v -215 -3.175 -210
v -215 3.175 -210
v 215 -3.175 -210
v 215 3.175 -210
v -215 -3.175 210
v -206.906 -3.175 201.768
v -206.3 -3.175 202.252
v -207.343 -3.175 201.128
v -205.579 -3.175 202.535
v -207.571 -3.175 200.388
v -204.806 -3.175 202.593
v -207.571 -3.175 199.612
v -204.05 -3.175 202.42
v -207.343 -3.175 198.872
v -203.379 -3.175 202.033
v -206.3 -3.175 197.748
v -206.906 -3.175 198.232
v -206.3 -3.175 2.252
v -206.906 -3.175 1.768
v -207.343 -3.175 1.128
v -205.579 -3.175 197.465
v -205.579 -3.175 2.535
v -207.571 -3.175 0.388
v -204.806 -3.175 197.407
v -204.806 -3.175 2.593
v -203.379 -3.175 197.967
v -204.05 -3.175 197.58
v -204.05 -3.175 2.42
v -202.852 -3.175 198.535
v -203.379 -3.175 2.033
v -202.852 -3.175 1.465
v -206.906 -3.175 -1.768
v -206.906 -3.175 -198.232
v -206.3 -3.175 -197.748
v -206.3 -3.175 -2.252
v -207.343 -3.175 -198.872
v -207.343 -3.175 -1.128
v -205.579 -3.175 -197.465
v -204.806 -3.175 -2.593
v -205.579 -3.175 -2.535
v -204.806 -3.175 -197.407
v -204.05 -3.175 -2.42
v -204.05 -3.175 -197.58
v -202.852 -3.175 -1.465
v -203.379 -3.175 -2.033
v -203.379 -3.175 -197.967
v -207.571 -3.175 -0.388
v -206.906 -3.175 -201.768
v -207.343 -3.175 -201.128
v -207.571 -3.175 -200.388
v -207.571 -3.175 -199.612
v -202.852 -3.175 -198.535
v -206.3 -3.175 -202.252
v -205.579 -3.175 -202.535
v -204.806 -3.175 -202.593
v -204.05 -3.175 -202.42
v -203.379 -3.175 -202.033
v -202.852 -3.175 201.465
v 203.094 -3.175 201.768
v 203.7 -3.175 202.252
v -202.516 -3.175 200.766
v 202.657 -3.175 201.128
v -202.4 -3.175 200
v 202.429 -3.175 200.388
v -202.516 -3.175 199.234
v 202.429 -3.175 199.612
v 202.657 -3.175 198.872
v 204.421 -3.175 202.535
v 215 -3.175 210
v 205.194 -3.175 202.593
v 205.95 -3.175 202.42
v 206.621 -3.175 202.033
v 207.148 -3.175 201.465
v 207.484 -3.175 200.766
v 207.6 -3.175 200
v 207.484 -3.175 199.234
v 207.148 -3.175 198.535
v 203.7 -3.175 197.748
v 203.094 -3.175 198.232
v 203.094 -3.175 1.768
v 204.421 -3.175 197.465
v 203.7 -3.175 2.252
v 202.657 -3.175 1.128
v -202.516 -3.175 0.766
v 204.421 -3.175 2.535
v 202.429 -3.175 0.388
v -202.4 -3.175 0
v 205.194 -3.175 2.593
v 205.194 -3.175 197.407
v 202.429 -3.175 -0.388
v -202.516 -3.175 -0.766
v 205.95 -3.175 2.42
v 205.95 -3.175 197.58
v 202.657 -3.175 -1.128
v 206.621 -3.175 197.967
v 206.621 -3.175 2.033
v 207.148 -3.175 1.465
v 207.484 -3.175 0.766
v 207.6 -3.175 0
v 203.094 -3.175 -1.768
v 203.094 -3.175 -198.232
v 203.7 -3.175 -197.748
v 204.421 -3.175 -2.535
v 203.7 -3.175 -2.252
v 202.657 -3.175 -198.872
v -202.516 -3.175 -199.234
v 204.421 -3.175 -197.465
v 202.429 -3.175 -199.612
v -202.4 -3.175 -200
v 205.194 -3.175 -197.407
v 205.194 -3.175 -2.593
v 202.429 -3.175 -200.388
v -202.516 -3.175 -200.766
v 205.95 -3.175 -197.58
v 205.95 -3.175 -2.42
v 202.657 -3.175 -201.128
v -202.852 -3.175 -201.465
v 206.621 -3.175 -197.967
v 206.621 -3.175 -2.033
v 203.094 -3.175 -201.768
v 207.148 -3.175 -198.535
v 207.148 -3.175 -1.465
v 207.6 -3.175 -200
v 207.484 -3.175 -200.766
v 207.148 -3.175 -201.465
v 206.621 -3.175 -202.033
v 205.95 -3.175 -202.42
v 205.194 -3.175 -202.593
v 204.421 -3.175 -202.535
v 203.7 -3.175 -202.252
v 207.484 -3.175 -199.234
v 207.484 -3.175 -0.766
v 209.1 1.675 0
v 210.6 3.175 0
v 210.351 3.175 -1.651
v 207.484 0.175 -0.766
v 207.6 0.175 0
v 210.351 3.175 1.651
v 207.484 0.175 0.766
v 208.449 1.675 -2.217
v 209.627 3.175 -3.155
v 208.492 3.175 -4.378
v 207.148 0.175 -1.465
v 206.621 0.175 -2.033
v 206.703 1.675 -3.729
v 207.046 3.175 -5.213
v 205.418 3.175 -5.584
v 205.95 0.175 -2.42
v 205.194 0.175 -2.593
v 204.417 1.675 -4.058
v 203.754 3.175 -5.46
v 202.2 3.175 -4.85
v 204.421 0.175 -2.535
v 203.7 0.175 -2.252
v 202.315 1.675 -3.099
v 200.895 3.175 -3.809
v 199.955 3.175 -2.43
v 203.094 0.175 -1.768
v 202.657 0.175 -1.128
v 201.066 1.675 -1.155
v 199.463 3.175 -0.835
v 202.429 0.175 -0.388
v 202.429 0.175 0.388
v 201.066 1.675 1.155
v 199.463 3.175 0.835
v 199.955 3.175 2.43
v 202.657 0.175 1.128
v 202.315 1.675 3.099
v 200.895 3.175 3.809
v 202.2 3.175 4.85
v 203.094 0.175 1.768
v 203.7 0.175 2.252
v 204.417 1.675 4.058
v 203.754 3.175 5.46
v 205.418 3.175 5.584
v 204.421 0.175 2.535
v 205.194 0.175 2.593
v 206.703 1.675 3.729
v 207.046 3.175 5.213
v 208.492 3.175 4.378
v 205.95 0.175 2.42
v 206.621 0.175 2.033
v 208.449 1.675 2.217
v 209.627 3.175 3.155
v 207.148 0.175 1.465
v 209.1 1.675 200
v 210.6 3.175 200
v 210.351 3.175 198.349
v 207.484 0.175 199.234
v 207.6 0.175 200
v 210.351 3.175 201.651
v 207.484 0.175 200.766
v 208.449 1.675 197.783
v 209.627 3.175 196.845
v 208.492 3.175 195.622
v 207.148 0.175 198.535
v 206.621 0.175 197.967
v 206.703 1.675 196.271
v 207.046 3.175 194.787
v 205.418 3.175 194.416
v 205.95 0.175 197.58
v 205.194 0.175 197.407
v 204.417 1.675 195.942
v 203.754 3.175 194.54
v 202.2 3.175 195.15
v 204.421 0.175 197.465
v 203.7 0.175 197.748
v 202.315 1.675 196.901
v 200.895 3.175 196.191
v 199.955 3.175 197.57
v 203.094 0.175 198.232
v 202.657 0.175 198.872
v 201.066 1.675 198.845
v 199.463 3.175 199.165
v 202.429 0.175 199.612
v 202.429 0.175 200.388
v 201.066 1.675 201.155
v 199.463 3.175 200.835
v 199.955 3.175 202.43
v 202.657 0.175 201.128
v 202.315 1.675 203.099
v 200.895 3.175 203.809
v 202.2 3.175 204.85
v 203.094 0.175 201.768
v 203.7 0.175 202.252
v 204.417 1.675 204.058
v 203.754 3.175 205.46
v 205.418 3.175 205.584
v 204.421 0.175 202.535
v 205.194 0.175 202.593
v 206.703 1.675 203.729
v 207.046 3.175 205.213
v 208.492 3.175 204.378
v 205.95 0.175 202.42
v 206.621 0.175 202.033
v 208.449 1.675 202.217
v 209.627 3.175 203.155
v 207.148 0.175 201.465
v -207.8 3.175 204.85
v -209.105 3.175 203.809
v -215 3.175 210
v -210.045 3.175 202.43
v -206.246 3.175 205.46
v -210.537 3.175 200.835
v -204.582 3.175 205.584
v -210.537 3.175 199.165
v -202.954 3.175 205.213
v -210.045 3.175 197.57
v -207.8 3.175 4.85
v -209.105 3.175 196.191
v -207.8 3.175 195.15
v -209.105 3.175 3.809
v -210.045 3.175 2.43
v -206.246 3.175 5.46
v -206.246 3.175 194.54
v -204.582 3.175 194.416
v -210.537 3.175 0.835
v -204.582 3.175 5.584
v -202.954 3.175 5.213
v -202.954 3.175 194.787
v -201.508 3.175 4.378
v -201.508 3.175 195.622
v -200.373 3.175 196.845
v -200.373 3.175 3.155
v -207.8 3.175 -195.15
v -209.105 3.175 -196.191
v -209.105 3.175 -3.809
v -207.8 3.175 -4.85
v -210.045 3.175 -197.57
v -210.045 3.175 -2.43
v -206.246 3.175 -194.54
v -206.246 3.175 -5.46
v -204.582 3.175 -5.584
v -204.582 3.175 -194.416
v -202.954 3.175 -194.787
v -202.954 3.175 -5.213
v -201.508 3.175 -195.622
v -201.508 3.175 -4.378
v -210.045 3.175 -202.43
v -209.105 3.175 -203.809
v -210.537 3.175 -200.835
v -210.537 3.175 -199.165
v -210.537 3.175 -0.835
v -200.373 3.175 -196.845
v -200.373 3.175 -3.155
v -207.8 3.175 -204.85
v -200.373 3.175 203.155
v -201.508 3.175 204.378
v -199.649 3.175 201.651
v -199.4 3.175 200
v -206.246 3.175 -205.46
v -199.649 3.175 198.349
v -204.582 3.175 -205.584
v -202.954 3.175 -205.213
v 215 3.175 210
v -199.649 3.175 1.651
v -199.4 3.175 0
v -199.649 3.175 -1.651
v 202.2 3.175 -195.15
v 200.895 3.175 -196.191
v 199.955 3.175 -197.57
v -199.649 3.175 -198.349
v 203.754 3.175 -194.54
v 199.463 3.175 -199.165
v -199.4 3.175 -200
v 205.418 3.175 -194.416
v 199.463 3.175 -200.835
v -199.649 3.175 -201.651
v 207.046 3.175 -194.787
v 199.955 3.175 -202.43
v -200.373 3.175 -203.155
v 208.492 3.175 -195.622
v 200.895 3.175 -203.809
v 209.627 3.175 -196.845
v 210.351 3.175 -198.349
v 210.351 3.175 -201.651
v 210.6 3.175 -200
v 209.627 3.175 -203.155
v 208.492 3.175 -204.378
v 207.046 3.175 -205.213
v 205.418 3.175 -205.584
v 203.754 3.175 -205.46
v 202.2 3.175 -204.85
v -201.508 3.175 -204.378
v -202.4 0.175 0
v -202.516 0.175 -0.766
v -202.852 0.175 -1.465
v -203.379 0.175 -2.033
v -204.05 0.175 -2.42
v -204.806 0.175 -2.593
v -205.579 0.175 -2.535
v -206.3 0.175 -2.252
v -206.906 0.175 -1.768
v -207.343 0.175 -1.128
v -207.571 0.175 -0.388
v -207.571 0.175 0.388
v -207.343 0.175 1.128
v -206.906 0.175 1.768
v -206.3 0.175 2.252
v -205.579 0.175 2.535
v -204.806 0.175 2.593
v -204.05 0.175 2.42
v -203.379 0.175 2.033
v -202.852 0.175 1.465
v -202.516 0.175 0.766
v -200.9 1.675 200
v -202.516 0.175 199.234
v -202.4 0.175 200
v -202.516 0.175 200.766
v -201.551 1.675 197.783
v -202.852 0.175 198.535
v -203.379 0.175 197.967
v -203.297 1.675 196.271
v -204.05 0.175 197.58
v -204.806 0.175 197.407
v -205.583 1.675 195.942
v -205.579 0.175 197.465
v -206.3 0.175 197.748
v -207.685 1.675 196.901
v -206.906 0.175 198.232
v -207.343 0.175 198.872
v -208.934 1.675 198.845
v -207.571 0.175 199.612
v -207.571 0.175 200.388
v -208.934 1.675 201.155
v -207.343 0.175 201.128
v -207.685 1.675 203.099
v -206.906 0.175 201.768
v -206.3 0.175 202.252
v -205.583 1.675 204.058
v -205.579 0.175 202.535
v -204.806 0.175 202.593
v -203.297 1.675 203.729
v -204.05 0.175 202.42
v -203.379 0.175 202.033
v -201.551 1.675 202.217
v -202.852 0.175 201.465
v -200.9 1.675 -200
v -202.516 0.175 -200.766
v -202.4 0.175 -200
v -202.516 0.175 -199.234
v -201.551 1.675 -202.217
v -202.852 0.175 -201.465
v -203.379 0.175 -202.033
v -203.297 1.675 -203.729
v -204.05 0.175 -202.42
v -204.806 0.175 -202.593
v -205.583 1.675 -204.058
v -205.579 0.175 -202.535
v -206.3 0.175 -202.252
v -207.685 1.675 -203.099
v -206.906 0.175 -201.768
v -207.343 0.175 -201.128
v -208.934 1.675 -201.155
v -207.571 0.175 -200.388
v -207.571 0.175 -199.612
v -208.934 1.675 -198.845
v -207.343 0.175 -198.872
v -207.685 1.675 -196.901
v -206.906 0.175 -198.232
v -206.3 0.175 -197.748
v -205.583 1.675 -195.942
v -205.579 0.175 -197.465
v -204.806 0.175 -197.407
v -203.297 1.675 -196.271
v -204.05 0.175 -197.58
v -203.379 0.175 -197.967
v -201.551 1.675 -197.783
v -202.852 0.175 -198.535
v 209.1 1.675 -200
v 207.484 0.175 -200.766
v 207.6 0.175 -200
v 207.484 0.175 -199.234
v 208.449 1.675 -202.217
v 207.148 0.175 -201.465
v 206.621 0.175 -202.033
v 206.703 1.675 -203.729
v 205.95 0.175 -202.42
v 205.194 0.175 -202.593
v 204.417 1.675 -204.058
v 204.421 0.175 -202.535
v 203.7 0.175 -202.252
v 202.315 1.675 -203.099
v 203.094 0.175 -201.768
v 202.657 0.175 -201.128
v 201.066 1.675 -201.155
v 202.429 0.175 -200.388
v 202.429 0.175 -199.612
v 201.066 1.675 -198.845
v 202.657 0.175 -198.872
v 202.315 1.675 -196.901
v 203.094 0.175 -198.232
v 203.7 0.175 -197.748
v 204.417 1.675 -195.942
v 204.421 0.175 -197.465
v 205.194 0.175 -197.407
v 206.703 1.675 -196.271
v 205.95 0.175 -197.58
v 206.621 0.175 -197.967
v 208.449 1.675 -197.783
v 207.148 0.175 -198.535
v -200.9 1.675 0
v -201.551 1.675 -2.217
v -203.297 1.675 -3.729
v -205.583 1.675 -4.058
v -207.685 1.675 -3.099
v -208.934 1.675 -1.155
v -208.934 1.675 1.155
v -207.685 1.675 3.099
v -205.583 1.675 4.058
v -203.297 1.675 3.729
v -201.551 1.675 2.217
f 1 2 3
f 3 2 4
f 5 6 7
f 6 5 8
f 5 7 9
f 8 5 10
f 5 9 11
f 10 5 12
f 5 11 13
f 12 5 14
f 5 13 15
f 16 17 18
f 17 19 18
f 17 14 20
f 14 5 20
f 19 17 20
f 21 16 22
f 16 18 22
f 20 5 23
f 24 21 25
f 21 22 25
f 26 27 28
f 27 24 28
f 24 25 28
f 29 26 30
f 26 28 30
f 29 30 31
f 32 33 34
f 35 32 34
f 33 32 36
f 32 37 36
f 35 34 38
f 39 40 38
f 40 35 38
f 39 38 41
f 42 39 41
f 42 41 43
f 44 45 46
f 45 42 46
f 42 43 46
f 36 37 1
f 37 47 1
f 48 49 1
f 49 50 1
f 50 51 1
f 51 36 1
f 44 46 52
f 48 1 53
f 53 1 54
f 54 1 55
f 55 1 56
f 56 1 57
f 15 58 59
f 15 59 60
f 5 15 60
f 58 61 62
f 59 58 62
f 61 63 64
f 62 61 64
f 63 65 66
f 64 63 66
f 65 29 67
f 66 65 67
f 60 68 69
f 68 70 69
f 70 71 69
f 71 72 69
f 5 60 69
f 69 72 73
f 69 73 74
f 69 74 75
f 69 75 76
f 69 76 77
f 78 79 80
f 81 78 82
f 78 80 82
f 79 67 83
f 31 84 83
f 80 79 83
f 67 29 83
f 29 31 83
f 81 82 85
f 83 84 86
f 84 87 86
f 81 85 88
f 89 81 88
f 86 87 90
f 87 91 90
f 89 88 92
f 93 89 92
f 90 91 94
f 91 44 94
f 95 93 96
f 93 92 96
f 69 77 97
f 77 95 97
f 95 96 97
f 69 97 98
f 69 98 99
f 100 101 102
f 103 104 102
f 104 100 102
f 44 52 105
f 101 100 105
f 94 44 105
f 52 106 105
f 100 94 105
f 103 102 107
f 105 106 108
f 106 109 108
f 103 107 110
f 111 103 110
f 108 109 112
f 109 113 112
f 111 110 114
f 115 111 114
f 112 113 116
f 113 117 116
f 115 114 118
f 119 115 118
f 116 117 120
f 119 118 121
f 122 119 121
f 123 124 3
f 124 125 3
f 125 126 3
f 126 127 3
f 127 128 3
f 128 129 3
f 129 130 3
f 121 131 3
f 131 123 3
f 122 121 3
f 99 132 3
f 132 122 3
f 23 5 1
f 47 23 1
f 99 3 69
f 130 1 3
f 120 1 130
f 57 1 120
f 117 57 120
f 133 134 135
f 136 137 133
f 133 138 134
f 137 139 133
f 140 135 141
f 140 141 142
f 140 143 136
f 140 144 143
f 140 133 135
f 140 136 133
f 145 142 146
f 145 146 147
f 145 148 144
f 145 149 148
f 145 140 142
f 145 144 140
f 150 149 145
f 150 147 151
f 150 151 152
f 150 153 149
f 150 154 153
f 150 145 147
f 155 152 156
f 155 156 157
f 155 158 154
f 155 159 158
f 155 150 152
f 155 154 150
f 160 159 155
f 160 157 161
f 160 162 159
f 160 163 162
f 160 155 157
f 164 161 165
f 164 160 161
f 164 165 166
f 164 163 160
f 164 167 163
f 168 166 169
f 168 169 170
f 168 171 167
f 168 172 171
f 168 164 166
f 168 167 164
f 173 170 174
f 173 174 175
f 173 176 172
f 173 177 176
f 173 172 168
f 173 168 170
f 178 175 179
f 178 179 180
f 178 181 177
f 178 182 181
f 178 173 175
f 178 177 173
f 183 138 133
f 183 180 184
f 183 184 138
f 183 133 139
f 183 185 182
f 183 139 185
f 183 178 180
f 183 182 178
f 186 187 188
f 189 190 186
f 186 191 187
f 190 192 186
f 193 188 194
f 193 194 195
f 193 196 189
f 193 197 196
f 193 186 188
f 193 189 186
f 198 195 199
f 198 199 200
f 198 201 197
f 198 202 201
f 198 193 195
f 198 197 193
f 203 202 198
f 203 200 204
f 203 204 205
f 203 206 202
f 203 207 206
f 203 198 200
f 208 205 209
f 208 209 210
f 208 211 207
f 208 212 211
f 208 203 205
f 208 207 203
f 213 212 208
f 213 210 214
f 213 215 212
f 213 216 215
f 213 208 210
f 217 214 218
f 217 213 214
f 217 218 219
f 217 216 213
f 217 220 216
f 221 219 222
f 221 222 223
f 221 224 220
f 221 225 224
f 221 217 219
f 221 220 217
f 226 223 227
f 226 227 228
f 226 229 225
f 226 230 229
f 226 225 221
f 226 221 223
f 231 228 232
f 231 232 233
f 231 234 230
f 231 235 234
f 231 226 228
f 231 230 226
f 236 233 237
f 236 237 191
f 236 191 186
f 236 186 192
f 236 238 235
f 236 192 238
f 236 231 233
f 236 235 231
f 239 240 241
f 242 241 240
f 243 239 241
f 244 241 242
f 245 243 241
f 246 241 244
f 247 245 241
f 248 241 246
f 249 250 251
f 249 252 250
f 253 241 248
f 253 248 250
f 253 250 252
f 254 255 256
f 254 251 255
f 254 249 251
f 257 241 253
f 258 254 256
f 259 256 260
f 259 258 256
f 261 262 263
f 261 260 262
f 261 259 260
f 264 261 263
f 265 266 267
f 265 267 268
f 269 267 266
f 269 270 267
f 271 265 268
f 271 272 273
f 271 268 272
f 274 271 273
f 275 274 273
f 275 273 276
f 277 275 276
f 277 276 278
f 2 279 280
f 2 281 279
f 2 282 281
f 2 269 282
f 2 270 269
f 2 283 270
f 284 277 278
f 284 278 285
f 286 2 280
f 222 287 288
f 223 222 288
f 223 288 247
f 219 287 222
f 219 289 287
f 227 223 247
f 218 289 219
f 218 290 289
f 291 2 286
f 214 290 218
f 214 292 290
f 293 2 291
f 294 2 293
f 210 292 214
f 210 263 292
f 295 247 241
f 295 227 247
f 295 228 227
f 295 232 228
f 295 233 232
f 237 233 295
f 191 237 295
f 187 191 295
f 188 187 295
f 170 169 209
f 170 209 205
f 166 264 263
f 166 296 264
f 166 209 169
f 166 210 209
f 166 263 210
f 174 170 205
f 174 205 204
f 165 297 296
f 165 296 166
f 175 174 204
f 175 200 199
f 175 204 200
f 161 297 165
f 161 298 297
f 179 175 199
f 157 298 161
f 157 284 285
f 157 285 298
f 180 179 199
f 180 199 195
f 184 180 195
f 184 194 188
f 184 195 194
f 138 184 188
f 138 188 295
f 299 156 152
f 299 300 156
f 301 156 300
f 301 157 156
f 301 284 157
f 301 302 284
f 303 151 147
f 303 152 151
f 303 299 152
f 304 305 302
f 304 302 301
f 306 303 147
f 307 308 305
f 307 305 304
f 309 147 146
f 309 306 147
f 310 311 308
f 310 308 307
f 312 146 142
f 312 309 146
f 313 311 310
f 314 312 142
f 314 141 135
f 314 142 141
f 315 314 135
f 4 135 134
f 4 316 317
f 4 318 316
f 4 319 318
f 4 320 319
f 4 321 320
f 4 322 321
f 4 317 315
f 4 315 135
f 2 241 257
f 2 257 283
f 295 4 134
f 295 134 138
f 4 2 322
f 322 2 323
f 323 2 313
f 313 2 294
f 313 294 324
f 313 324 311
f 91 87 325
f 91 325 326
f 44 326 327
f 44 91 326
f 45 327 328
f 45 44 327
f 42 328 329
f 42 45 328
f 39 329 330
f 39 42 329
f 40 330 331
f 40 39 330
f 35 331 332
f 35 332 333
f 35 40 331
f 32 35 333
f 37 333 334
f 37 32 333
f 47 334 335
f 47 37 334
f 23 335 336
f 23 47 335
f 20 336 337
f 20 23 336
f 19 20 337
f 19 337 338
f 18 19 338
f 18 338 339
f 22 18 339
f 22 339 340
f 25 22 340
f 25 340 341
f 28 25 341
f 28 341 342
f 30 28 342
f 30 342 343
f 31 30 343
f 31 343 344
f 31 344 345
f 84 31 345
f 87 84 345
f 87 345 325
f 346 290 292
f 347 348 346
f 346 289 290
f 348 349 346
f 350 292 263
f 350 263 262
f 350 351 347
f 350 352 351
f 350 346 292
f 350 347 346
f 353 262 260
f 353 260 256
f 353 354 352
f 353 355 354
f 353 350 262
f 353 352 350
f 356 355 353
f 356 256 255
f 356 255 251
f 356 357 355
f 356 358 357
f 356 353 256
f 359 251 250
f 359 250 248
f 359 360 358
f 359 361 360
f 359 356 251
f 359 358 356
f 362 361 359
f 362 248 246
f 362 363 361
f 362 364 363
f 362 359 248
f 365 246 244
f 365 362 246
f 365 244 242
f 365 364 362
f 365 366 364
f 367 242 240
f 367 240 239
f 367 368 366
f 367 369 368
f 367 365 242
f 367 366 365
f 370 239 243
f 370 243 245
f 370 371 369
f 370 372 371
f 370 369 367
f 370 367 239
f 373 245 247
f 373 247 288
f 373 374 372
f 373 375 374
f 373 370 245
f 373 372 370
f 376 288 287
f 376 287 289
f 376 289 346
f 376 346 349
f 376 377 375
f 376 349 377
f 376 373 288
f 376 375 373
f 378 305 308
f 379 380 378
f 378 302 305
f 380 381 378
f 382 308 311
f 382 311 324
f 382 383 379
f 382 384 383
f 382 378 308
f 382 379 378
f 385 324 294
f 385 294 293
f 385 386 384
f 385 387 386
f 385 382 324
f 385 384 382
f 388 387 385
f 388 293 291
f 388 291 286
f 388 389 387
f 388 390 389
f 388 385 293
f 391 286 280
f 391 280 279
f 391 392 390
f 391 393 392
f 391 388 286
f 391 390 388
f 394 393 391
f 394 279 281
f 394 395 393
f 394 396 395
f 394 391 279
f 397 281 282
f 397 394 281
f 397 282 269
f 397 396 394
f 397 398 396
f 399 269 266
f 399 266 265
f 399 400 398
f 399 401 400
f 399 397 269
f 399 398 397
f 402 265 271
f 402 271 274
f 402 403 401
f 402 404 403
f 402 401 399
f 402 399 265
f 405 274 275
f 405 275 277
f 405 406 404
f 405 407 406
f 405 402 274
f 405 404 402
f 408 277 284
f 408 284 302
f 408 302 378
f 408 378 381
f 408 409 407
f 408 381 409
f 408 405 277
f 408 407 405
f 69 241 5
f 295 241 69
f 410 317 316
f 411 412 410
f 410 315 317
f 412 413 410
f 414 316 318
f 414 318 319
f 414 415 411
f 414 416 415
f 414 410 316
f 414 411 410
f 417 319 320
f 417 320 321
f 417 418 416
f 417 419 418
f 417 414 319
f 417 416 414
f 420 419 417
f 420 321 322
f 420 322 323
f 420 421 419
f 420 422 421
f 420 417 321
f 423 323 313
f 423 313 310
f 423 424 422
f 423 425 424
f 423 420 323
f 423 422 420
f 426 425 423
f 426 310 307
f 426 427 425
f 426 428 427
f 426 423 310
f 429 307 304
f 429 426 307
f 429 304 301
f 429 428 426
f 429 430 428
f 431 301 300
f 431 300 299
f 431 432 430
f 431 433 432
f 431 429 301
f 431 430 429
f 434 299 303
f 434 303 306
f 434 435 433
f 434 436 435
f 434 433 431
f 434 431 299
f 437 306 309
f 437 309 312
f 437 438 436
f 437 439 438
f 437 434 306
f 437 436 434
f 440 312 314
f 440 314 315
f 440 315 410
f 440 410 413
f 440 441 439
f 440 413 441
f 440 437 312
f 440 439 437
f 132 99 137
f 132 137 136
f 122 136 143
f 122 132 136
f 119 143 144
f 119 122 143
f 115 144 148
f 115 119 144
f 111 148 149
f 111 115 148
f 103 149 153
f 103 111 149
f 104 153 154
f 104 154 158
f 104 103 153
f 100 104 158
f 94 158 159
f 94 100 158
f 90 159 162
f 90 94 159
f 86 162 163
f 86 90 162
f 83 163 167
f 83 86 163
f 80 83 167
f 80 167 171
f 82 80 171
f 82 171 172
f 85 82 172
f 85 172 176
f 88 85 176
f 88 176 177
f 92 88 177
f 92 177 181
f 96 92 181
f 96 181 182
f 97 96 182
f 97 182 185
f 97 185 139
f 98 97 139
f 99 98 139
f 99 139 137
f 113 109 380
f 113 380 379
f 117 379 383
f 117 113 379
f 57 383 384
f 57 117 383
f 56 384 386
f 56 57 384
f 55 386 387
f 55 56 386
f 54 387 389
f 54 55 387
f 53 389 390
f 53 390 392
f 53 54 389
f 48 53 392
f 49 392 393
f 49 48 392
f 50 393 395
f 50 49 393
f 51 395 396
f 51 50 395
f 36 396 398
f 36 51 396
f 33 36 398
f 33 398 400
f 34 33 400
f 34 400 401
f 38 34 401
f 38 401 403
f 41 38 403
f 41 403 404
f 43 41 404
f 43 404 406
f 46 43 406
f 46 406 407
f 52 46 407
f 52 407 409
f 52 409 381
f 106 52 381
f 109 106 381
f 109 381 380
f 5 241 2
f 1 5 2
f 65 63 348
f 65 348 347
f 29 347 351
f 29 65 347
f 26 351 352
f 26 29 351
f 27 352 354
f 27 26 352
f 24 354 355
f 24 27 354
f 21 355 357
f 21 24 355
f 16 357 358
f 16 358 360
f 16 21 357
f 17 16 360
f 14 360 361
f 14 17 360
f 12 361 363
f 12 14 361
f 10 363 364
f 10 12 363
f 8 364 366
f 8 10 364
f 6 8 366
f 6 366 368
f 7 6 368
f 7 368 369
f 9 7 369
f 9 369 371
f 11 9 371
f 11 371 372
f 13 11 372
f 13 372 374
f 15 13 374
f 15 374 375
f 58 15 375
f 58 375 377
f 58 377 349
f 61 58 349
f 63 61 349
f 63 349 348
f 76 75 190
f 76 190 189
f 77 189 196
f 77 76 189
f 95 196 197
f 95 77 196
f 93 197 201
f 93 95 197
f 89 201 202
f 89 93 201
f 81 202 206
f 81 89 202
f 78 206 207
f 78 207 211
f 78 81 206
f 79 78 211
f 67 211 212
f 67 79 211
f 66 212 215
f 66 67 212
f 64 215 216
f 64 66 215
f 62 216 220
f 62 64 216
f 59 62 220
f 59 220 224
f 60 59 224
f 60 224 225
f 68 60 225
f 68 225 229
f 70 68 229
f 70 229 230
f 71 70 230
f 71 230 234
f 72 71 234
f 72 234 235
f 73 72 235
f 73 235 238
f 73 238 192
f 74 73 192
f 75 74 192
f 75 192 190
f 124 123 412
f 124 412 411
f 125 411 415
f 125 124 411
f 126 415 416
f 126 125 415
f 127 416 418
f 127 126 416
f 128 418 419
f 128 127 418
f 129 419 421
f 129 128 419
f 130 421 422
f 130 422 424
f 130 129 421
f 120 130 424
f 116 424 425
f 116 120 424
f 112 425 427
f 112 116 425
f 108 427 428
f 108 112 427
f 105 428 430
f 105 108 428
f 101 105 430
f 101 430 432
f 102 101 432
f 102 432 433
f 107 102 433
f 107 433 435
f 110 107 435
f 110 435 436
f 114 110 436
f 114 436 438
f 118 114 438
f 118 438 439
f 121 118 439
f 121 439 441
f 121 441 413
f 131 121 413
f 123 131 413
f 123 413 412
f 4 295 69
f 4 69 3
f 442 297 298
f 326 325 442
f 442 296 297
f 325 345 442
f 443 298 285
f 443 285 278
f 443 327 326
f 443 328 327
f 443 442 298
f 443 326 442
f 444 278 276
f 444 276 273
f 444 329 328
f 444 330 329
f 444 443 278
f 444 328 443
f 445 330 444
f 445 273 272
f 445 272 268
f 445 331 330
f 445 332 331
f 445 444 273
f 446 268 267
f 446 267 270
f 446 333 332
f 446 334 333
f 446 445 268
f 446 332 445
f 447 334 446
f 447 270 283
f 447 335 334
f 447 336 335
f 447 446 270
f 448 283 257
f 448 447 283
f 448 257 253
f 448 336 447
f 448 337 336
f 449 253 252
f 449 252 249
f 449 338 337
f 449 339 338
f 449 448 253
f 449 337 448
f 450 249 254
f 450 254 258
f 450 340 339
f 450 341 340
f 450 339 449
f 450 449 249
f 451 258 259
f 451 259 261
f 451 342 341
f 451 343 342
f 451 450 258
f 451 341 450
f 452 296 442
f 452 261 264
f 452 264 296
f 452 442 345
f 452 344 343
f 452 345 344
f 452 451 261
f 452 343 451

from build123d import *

# Parameters (mm, degrees)
SKETCH2_W           = 430
SKETCH2_H           = 420
SKETCH2_R           = 2.6
BOSS_EXTRUDE1_DEPTH = 3.175
CHAMFER1_SIZE       = 3


with BuildPart() as part:
    # Sketch2 → Boss-Extrude1 (new body, symmetric)
    with BuildSketch(Plane(origin=(0, 0, 0), x_dir=(1, 0, 0), z_dir=(0, 1, 0))):
        Rectangle(SKETCH2_W, SKETCH2_H)
        with Locations((-205, 200)):
            Circle(SKETCH2_R, mode=Mode.SUBTRACT)
        with Locations((205, 200)):
            Circle(SKETCH2_R, mode=Mode.SUBTRACT)
        with Locations((205, -200)):
            Circle(SKETCH2_R, mode=Mode.SUBTRACT)
        with Locations((-205, -200)):
            Circle(SKETCH2_R, mode=Mode.SUBTRACT)
        with Locations((-205, 0)):
            Circle(SKETCH2_R, mode=Mode.SUBTRACT)
        with Locations((205, 0)):
            Circle(SKETCH2_R, mode=Mode.SUBTRACT)
    extrude(amount=BOSS_EXTRUDE1_DEPTH, both=True)

    # Chamfer1
    chamfer1_edges = [part.edges().sort_by_distance(p)[0] for p in [
        (-207.6, 3.175, -200),
        (202.4, 3.175, -200),
        (202.4, 3.175, 200),
        (-207.6, 3.175, 200),
        (-207.6, 3.175, 0),
        (202.4, 3.175, 0),
    ]]
    chamfer(chamfer1_edges, length=CHAMFER1_SIZE)


solid = part.part
